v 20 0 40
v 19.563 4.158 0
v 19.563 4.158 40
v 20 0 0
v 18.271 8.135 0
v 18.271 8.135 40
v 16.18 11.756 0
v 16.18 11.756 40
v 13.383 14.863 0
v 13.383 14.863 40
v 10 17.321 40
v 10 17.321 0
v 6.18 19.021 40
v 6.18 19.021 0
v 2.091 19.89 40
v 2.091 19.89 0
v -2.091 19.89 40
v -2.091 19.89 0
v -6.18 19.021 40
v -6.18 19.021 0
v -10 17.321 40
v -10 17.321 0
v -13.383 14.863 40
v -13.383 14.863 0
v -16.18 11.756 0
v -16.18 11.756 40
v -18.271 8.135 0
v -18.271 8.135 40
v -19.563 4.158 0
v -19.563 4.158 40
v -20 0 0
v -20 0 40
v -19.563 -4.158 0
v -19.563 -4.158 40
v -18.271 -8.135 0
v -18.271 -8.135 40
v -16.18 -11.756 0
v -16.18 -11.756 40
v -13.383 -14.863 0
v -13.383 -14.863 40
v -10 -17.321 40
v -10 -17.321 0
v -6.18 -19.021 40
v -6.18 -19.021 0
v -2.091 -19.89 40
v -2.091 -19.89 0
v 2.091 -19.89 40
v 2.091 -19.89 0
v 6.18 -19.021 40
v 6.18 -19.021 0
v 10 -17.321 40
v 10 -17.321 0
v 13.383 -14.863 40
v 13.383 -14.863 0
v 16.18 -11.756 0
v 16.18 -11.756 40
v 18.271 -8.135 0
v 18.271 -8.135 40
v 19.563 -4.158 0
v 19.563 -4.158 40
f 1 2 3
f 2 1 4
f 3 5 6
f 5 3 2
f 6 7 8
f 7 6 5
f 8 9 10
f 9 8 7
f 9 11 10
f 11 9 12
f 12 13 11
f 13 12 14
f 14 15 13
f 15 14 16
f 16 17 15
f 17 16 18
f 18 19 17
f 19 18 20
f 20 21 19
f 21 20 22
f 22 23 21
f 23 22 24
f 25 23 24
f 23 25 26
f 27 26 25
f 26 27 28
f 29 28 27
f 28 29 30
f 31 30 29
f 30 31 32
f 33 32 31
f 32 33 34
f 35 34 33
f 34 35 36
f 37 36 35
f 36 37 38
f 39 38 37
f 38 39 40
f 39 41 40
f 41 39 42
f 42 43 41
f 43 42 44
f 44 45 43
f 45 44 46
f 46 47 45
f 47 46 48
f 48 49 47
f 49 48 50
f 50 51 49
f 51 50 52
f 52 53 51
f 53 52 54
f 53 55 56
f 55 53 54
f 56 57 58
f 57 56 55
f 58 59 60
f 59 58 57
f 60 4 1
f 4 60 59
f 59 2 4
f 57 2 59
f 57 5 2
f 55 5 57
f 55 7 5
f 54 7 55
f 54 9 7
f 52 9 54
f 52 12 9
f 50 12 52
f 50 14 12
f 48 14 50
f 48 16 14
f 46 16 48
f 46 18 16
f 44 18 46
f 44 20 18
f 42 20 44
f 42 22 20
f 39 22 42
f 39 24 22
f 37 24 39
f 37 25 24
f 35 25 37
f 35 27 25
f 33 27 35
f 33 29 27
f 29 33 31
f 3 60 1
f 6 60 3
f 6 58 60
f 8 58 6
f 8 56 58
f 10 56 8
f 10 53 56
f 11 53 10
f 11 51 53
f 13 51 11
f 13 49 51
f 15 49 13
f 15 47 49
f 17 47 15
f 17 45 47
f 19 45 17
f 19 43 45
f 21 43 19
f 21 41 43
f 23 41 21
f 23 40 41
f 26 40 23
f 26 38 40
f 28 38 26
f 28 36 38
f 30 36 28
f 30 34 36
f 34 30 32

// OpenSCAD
radius = 20;
height = 2*radius;
cylinder(h = height, r = radius);
echo("I made a cylinder with height = ", height);
